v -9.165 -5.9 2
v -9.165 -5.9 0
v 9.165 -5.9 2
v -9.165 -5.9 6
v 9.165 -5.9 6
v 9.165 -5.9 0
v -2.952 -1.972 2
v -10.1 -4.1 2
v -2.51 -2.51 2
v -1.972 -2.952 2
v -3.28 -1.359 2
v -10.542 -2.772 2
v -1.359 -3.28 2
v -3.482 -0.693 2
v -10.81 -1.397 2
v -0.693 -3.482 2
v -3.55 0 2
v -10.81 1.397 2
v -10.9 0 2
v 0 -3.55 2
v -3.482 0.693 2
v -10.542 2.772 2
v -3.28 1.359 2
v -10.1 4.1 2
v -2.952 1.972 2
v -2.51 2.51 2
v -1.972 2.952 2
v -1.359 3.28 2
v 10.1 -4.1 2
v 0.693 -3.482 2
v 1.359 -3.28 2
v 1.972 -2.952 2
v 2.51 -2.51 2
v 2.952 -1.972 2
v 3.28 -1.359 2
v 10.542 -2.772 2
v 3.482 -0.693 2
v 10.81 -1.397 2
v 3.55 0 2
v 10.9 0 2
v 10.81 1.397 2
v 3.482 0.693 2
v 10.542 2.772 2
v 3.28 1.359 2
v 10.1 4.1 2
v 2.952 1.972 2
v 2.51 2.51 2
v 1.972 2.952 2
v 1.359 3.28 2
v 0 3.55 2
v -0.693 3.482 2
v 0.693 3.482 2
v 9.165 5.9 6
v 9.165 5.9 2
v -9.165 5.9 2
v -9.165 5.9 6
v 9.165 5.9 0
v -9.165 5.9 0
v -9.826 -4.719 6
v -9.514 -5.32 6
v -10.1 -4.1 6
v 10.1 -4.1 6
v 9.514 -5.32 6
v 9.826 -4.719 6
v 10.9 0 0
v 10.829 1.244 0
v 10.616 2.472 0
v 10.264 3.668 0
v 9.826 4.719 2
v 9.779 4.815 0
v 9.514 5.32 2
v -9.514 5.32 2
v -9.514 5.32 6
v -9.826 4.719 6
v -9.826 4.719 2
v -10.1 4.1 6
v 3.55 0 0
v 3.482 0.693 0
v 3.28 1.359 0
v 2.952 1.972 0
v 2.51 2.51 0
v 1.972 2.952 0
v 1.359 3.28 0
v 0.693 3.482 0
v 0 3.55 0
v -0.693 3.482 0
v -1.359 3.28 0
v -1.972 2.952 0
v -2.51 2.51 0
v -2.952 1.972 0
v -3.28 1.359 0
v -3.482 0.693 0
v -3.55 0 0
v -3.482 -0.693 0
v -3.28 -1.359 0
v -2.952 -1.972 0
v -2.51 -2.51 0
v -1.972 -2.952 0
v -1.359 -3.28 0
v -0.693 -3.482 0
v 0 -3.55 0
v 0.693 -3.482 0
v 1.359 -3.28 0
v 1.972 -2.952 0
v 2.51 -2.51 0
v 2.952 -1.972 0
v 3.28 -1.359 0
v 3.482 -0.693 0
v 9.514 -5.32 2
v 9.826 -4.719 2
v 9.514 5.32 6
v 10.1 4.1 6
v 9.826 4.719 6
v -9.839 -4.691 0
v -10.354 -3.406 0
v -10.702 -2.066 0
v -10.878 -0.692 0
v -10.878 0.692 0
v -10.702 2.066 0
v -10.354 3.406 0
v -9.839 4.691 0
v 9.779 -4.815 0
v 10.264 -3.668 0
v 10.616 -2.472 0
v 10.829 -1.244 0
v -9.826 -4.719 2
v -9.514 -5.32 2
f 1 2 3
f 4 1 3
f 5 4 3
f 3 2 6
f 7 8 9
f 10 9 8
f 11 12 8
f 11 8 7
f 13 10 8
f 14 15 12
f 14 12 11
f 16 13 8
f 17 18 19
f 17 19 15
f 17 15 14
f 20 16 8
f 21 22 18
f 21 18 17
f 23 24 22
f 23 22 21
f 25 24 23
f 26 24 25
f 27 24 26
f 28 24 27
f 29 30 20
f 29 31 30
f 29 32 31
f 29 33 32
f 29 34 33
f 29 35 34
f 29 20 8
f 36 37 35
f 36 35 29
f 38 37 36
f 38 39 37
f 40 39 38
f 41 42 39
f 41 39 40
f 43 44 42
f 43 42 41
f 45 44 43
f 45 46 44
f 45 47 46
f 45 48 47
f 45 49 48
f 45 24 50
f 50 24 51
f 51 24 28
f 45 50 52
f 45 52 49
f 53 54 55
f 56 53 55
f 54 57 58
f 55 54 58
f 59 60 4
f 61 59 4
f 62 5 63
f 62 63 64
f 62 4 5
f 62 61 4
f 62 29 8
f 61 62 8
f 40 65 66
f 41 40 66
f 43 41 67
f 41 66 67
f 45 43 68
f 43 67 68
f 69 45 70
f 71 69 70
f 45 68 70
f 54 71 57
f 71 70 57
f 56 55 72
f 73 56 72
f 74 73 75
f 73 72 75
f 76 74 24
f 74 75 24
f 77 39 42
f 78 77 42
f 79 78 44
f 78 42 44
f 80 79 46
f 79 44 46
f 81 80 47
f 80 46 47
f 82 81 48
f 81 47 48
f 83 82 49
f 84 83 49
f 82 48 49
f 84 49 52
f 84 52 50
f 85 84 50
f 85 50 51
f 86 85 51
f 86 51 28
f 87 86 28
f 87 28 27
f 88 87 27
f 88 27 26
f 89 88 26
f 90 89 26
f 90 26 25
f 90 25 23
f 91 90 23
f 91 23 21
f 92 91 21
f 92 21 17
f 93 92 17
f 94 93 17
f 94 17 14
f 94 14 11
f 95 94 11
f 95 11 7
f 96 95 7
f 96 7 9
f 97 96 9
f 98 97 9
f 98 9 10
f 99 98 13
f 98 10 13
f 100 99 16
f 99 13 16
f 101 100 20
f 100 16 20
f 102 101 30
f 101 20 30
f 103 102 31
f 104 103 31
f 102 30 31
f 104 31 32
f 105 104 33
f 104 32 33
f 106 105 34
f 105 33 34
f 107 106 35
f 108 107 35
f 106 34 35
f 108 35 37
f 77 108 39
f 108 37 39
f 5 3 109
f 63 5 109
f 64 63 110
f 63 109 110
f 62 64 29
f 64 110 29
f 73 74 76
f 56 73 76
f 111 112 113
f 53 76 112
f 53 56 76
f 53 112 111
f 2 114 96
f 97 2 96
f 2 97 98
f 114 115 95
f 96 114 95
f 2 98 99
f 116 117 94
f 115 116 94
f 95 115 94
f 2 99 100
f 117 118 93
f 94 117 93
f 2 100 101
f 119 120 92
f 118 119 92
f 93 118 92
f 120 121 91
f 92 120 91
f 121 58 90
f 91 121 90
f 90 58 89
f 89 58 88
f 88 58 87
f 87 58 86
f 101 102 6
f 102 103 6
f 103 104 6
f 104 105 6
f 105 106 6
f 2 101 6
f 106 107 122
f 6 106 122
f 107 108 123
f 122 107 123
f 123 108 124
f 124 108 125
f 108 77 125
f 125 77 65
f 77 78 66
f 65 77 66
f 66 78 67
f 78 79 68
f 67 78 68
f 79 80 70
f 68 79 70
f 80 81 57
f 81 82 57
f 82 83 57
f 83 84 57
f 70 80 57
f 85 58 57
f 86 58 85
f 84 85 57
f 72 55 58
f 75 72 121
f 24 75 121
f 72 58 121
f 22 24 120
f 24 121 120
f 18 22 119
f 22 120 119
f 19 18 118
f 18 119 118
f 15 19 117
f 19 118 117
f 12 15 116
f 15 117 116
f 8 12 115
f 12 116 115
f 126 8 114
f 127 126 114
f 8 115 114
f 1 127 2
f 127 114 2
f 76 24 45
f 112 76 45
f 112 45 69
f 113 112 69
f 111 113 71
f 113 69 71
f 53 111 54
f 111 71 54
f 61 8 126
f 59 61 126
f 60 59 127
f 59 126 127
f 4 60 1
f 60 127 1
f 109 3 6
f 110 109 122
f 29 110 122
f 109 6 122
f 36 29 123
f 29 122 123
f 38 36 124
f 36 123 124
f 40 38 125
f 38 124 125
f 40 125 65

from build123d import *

# Parameters (mm, degrees)
F1_DEPTH = 2
F2_R     = 3.55
F3_DEPTH = 25
F5_DEPTH = 4


with BuildPart() as f1:
    # F0 (on Top) → F1 (new body)
    with BuildSketch(Plane.XY):
        with BuildLine():
            ThreePointArc((9.165151, -5.9), (10.457298, -3.074886), (10.9, 0))
            ThreePointArc((10.9, 0), (10.457298, 3.074886), (9.165151, 5.9))
            Line((9.165151, 5.9), (-9.165151, 5.9))
            ThreePointArc((-9.165151, 5.9), (-10.9, 0), (-9.165151, -5.9))
            Line((-9.165151, -5.9), (9.165151, -5.9))
        make_face()
    extrude(amount=F1_DEPTH)

    # F2 (on face) → F3 (cut)
    with BuildSketch(Plane.XY.offset(2)):
        Circle(F2_R)
    extrude(amount=-F3_DEPTH, mode=Mode.SUBTRACT)

    # F4 (on face) → F5 (join)
    with BuildSketch(Plane.XY.offset(2)):
        with BuildLine():
            Line((-10.099505, 4.1), (10.099505, 4.1))
            ThreePointArc((10.099505, 4.1), (9.674283, 5.021778), (9.165151, 5.9))
            Line((9.165151, 5.9), (-9.165151, 5.9))
            ThreePointArc((-9.165151, 5.9), (-9.674283, 5.021778), (-10.099505, 4.1))
        make_face()
        with BuildLine():
            ThreePointArc((9.165151, -5.9), (9.674283, -5.021778), (10.099505, -4.1))
            Line((10.099505, -4.1), (-10.099505, -4.1))
            ThreePointArc((-10.099505, -4.1), (-9.674283, -5.021778), (-9.165151, -5.9))
            Line((-9.165151, -5.9), (9.165151, -5.9))
        make_face()
    extrude(amount=F5_DEPTH)


solid = f1.part
